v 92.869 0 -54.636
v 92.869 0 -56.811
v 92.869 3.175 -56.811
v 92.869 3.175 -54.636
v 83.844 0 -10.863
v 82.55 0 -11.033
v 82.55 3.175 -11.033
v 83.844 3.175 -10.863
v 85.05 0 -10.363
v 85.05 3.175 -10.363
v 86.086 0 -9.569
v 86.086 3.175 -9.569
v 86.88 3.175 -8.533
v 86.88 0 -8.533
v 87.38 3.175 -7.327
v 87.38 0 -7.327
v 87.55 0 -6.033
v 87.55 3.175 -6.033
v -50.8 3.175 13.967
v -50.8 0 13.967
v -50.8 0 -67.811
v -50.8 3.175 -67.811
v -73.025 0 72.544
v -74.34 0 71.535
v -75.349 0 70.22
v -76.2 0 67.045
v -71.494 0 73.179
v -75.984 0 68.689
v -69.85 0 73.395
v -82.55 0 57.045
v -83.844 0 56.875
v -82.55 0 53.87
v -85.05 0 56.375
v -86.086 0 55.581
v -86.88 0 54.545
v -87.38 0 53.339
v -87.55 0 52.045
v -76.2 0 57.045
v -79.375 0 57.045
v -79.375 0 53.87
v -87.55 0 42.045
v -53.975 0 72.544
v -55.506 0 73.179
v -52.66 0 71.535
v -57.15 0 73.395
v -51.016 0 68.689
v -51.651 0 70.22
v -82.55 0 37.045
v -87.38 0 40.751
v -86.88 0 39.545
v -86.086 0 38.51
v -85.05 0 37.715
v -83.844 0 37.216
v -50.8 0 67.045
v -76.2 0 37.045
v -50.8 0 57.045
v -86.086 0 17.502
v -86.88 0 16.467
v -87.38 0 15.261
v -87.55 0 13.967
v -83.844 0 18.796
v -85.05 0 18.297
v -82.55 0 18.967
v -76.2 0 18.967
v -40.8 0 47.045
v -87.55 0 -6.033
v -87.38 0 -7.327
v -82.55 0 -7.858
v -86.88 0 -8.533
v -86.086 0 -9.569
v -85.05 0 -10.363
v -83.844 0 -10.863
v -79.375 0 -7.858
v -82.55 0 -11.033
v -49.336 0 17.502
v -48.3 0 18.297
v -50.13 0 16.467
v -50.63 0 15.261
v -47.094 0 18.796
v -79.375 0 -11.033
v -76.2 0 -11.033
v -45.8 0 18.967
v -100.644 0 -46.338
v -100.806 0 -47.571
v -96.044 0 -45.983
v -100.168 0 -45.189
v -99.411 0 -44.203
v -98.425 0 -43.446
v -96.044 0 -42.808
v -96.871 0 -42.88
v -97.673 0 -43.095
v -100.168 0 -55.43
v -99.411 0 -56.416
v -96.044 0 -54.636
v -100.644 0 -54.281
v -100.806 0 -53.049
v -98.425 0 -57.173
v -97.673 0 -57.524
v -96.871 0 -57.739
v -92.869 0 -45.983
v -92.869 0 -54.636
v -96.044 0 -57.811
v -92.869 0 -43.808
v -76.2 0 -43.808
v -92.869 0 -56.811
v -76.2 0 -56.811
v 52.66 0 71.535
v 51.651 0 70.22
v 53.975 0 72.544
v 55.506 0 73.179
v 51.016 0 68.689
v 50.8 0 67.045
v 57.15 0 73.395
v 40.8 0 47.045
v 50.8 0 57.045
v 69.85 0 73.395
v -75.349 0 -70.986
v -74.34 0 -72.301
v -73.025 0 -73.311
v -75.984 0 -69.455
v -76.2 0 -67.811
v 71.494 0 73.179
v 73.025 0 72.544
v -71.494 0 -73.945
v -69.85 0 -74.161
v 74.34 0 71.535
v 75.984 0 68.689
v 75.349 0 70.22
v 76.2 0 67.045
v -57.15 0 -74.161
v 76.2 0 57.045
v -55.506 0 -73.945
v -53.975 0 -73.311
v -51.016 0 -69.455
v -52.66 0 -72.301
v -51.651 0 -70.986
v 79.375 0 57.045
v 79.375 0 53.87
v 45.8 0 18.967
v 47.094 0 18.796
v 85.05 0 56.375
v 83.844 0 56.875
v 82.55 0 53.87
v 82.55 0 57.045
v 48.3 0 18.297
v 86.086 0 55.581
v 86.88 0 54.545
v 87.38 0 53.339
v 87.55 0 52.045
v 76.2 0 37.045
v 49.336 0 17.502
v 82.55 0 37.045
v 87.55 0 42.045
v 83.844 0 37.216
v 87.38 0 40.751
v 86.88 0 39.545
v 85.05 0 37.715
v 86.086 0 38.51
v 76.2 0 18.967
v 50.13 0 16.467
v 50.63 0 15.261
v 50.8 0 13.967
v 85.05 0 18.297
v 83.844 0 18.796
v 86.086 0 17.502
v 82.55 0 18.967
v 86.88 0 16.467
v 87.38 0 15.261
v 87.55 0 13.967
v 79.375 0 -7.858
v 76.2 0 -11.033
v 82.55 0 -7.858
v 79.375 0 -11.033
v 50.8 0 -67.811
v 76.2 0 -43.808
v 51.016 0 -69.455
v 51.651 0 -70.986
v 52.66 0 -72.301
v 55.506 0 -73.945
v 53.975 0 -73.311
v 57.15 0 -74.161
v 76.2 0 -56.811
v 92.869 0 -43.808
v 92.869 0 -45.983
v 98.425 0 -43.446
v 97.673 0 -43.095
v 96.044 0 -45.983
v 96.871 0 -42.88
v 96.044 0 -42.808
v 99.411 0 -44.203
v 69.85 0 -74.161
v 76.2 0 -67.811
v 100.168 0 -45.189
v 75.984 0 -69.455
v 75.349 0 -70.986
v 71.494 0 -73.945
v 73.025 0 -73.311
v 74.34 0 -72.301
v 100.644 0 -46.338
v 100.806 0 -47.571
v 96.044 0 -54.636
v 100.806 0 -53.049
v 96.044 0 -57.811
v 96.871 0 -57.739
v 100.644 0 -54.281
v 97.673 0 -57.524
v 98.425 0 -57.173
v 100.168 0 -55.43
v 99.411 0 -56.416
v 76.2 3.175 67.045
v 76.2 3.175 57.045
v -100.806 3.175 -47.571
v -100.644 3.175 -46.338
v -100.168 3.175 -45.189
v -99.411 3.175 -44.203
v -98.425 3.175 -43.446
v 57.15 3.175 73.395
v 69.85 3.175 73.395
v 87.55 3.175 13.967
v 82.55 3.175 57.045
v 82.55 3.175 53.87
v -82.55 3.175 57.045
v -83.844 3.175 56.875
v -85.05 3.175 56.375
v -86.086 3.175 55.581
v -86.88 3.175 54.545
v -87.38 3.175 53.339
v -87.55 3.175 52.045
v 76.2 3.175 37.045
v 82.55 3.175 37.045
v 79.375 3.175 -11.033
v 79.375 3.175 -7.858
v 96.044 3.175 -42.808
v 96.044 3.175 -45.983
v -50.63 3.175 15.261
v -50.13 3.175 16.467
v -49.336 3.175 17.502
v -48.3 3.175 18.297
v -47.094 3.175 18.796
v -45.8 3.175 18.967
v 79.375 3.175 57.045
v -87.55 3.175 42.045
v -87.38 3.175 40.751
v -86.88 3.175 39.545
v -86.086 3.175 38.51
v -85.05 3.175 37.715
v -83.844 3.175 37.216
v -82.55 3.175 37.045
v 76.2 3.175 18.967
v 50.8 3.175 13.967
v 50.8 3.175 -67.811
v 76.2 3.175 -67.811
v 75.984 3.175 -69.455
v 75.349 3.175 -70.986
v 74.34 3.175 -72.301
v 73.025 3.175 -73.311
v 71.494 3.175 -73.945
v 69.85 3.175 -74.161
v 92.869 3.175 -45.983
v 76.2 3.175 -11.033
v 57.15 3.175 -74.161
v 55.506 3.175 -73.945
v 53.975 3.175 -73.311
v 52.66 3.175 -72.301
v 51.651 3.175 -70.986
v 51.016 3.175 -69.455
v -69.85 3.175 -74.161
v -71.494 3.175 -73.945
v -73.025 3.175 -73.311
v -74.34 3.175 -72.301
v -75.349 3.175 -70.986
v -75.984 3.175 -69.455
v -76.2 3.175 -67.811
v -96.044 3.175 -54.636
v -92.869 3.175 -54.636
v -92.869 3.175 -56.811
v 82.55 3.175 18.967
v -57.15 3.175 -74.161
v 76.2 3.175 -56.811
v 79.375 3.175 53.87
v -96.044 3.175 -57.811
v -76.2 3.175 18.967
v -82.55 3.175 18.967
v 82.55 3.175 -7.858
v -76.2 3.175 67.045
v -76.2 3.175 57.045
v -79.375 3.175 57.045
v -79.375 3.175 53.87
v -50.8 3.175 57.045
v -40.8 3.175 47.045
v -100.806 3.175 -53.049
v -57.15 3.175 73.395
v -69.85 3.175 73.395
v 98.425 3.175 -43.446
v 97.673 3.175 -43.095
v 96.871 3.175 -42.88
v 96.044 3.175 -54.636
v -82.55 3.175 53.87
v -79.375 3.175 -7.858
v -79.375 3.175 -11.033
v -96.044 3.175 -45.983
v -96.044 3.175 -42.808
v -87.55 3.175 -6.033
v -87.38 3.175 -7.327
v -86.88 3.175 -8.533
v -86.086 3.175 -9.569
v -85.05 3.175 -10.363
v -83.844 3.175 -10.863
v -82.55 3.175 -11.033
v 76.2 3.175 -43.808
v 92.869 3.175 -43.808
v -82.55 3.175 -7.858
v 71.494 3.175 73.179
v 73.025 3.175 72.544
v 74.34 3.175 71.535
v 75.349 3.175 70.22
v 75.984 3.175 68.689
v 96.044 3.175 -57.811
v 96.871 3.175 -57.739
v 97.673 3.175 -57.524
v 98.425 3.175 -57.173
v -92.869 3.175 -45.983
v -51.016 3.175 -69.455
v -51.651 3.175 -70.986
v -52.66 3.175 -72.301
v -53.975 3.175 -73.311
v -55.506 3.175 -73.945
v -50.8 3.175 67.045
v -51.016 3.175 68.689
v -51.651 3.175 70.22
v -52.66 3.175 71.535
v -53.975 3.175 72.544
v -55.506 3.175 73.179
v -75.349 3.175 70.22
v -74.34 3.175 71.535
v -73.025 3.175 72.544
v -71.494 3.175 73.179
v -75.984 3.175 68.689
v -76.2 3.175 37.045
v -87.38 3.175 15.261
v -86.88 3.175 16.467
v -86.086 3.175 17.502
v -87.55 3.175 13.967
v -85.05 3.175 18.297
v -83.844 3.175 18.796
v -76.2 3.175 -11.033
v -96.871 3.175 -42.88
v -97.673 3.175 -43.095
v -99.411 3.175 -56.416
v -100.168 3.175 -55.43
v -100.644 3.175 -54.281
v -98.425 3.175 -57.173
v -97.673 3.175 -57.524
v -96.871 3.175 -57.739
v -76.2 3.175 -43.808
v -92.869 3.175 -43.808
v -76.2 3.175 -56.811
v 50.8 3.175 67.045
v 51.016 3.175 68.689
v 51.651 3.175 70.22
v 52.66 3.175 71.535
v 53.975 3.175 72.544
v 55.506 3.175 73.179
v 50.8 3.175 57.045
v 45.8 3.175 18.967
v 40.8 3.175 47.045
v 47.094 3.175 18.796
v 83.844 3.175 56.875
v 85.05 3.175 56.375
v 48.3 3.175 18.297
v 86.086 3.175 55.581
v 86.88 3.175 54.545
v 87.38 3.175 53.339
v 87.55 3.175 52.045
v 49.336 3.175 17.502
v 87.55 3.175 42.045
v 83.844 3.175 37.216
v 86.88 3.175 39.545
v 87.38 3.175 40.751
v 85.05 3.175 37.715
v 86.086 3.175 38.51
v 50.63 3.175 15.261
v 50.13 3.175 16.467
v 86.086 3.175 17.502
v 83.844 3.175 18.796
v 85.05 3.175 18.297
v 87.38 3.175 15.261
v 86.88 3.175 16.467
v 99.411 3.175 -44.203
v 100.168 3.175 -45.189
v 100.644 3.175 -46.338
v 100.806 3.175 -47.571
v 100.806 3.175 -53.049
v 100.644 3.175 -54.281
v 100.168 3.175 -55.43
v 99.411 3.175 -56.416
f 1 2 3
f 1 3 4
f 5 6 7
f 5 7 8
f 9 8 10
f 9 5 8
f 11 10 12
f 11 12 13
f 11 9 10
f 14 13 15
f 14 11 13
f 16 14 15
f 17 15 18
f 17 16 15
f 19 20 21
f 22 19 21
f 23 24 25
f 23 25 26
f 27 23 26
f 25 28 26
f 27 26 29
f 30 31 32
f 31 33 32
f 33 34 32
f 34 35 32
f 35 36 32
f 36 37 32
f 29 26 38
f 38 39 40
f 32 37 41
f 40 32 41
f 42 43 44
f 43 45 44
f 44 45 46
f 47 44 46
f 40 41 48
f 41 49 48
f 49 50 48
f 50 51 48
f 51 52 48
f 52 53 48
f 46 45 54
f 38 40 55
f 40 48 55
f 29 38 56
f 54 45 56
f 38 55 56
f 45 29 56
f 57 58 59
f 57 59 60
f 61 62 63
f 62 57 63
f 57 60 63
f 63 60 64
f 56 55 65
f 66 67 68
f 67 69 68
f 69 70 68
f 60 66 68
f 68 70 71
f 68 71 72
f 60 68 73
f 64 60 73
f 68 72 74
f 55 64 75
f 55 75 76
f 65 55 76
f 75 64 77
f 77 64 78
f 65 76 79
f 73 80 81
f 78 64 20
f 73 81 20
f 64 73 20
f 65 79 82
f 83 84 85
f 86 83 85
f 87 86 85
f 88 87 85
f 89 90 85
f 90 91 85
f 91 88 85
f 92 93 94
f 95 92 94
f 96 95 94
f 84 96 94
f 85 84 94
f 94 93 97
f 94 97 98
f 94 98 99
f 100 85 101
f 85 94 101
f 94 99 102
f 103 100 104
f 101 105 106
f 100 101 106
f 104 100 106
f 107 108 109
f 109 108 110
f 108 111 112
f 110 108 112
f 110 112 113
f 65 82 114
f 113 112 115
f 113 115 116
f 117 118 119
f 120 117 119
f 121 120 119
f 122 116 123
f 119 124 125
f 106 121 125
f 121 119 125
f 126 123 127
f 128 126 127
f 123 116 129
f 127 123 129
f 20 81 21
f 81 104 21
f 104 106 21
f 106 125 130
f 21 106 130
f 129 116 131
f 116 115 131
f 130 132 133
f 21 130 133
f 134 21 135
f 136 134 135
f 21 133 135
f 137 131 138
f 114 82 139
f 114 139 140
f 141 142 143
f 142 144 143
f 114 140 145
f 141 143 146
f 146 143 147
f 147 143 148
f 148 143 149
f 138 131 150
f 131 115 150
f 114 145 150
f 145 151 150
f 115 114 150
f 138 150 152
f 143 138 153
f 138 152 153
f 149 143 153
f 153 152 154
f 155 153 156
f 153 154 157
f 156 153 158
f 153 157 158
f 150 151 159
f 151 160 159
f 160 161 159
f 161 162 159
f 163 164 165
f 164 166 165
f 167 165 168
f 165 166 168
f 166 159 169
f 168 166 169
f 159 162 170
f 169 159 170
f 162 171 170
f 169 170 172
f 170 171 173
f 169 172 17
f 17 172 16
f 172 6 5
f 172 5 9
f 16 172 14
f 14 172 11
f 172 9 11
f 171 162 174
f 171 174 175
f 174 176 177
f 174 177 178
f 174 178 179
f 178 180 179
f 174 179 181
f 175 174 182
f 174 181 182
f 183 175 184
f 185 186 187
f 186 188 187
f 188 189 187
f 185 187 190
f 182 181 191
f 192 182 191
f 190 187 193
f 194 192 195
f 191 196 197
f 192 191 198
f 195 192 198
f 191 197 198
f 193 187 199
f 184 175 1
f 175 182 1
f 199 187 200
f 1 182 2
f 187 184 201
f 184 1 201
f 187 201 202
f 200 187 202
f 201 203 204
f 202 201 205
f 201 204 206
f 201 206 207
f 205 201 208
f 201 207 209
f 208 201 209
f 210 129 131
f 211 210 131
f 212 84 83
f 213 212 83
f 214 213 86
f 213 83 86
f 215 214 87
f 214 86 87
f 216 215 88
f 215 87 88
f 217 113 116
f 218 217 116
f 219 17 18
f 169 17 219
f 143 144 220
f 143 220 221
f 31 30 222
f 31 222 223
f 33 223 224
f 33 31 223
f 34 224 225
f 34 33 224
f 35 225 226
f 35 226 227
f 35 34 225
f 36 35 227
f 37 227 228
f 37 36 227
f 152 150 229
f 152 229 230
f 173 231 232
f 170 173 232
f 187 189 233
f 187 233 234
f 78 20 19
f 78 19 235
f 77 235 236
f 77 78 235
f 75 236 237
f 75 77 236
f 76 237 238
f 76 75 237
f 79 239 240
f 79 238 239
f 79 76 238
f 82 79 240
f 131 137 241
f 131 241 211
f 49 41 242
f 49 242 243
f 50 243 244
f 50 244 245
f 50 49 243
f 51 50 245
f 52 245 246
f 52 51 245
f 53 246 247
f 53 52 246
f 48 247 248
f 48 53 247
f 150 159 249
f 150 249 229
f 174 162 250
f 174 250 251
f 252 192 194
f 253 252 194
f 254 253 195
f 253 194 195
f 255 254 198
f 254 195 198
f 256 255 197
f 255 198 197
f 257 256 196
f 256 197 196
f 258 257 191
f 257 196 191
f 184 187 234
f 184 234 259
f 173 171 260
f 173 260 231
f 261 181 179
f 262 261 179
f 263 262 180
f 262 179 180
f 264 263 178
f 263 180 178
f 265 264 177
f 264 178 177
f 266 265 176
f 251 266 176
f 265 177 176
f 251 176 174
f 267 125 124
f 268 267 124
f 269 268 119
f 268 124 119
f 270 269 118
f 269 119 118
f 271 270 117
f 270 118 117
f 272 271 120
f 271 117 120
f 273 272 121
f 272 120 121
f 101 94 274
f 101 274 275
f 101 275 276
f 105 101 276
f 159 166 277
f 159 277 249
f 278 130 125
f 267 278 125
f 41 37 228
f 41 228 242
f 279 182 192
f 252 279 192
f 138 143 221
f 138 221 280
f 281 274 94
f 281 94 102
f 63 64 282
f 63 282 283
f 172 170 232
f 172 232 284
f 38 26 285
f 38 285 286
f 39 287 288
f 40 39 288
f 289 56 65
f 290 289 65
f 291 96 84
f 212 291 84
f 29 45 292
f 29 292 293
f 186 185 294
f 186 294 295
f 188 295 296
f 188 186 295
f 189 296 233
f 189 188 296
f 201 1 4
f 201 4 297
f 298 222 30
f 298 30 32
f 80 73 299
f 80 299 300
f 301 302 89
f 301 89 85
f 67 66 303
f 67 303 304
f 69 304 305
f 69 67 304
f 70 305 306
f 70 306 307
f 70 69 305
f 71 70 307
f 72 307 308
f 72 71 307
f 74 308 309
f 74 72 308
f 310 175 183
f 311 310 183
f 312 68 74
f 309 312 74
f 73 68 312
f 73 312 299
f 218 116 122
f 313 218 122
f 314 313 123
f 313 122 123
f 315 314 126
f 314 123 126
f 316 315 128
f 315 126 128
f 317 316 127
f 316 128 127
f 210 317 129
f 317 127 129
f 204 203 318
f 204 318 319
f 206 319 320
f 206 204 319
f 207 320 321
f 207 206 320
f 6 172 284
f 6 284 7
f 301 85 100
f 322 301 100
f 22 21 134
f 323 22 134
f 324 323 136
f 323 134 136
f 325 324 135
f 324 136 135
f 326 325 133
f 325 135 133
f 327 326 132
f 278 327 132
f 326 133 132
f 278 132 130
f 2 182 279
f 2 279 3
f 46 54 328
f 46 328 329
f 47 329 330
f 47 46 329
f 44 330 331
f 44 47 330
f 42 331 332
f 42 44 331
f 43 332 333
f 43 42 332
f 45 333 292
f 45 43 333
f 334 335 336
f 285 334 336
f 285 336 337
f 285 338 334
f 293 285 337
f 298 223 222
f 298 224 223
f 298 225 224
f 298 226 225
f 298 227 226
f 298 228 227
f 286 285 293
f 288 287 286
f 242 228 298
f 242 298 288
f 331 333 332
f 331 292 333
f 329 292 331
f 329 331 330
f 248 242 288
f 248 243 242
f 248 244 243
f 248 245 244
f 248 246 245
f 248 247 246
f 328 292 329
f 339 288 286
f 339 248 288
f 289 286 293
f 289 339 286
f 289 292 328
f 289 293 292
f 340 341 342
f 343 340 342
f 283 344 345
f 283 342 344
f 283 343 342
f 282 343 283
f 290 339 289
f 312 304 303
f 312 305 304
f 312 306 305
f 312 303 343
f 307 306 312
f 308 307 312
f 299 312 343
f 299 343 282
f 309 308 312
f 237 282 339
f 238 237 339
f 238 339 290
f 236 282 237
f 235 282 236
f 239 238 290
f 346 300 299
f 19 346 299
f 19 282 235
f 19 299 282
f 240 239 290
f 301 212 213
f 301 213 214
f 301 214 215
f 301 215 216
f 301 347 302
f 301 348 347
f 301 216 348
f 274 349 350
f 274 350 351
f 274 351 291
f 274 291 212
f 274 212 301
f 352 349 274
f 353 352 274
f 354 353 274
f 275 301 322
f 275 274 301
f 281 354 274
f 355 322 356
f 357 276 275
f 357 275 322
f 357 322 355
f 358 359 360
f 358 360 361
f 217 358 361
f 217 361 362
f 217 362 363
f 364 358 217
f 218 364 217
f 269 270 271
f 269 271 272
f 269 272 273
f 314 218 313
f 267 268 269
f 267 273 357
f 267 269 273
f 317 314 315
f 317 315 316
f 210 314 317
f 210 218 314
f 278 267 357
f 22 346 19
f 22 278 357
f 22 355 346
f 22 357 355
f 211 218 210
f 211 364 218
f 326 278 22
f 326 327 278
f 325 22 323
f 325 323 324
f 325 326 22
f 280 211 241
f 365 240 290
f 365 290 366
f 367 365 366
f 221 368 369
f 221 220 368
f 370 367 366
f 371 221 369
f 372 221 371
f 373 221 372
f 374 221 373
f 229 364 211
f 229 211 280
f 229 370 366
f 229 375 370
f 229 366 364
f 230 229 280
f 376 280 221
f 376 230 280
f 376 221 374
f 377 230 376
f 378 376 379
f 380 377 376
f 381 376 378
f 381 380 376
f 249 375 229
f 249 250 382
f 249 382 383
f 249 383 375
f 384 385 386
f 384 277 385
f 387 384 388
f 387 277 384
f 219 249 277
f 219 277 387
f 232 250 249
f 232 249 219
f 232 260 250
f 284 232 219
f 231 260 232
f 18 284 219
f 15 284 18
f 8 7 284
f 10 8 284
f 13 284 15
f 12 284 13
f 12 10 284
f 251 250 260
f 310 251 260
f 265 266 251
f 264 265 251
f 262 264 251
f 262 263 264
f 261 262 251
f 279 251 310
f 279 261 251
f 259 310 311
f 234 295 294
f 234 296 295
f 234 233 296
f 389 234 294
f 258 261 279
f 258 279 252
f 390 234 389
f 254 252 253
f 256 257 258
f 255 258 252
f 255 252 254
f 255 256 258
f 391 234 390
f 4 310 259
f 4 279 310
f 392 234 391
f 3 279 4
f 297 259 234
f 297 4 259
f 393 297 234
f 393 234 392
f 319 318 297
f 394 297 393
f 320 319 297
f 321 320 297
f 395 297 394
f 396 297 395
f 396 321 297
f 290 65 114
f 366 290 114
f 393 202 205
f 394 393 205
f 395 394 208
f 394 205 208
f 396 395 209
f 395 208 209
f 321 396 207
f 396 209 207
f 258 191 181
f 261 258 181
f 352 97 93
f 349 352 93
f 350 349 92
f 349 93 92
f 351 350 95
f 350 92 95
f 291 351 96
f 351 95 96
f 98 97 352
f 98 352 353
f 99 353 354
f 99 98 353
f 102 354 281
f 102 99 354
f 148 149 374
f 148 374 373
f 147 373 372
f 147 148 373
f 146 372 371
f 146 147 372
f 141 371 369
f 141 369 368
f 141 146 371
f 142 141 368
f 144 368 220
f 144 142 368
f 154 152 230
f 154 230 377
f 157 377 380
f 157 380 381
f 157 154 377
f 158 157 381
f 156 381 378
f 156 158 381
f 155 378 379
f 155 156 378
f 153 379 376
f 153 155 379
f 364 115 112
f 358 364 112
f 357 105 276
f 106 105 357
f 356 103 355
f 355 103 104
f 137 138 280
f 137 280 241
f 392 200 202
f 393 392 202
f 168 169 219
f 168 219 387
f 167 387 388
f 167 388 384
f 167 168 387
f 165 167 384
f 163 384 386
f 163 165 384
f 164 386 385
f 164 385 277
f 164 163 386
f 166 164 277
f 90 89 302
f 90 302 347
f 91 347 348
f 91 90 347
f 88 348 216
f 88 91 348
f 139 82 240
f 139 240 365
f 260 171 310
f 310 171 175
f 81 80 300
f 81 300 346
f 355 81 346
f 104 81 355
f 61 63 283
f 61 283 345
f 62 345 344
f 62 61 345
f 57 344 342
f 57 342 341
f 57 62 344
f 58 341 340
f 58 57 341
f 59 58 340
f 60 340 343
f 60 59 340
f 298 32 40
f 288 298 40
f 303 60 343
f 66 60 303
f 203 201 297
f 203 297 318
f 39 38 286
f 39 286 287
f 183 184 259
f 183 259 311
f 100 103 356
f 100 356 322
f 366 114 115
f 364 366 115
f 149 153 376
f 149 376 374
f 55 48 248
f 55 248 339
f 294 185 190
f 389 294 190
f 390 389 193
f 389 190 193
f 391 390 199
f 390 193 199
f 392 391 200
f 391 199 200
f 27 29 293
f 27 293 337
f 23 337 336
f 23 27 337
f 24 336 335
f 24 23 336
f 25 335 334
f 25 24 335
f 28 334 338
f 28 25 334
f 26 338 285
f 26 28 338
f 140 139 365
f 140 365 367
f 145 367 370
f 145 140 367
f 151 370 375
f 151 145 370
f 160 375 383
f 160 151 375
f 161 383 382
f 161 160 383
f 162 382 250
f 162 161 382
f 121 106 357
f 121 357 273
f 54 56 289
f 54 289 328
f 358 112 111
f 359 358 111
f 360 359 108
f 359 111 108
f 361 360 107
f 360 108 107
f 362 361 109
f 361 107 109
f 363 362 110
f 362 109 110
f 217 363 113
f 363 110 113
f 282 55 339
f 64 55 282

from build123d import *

# Parameters (mm, degrees)
SKETCH1_W           = 196.85
SKETCH1_H           = 120
BOSS_EXTRUDE1_DEPTH = 3.175
SKETCH2_W           = 152.4
SKETCH2_H           = 2.188710325
SKETCH2_W_2         = 3.175
SKETCH2_H_2         = 3.175
CUT_EXTRUDE3_DEPTH  = 3.175
BOSS_EXTRUDE3_DEPTH = 3.175
CUT_EXTRUDE5_DEPTH  = 6.175
BOSS_EXTRUDE4_DEPTH = 3.175
SKETCH8_W           = 16.66875
SKETCH8_H           = 1
CUT_EXTRUDE6_DEPTH  = 4
SKETCH9_W           = 16.66875
SKETCH9_H           = 1
CUT_EXTRUDE7_DEPTH  = 4


with BuildPart() as part:
    # Sketch1 → Boss-Extrude1 (new body)
    with BuildSketch(Plane(origin=(0, 0, 0), x_dir=(1, 0, 0), z_dir=(0, 1, 0))):
        Rectangle(SKETCH1_W, SKETCH1_H)
    extrude(amount=BOSS_EXTRUDE1_DEPTH)

    # Sketch2 → Cut-Extrude3 (cut)
    with BuildSketch(Plane(origin=(0, 0, 0), x_dir=(1, 0, 0), z_dir=(0, 1, 0))):
        with BuildLine():
            ThreePointArc((-87.55, -42.045183145), (-86.085533906, -38.509649239), (-82.55, -37.045183145))
            Line((-82.55, -37.045183145), (-98.425, -37.045183145))
            Line((-98.425, -37.045183145), (-98.425, -57.045183145))
            Line((-98.425, -57.045183145), (-82.55, -57.045183145))
            ThreePointArc((-82.55, -57.045183145), (-86.085533906, -55.580717051), (-87.55, -52.045183145))
            Line((-87.55, -52.045183145), (-87.55, -42.045183145))
        make_face()
        Polygon((-82.55, -37.045183145), (-76.2, -37.045183145), (-76.2, -18.966736095), (-82.55, -18.966736095), (-98.425, -18.966736095), (-98.425, -37.045183145), align=None)
        with BuildLine():
            Line((-98.425, -18.966736095), (-82.55, -18.966736095))
            ThreePointArc((-82.55, -18.966736095), (-86.085533906, -17.502270001), (-87.55, -13.966736095))
            Line((-87.55, -13.966736095), (-87.55, 6.033263905))
            ThreePointArc((-87.55, 6.033263905), (-86.085533906, 9.568797811), (-82.55, 11.033263905))
            Line((-82.55, 11.033263905), (-98.425, 11.033263905))
            Line((-98.425, 11.033263905), (-98.425, -18.966736095))
        make_face()
        with BuildLine():
            Line((-76.2, 11.033263905), (-76.2, 42.808053265))
            Line((-76.2, 42.808053265), (-92.86875, 42.808053265))
            Line((-92.86875, 42.808053265), (-96.04375, 42.808053265))
            ThreePointArc((-96.04375, 42.808053265), (-97.276375702, 42.970331517), (-98.425, 43.44610728))
            Line((-98.425, 43.44610728), (-98.425, 11.033263905))
            Line((-98.425, 11.033263905), (-82.55, 11.033263905))
            Line((-82.55, 11.033263905), (-79.375, 11.033263905))
            Line((-79.375, 11.033263905), (-76.2, 11.033263905))
        make_face()
        with BuildLine():
            Line((-92.86875, 57.811289675), (-76.2, 57.811289675))
            Line((-76.2, 57.811289675), (-76.2, 60))
            Line((-76.2, 60), (-98.425, 60))
            Line((-98.425, 60), (-98.425, 57.173235661))
            ThreePointArc((-98.425, 57.173235661), (-97.276375702, 57.649011423), (-96.04375, 57.811289675))
            Line((-96.04375, 57.811289675), (-92.86875, 57.811289675))
        make_face()
        with Locations((0, 58.905644838)):
            Rectangle(SKETCH2_W, SKETCH2_H)
        with BuildLine():
            Line((76.2, 60), (76.2, 57.811289675))
            Line((76.2, 57.811289675), (92.86875, 57.811289675))
            Line((92.86875, 57.811289675), (92.86875, 54.636289675))
            Line((92.86875, 54.636289675), (96.04375, 54.636289675))
            Line((96.04375, 54.636289675), (96.04375, 57.811289675))
            ThreePointArc((96.04375, 57.811289675), (97.276375702, 57.649011423), (98.425, 57.173235661))
            Line((98.425, 57.173235661), (98.425, 60))
            Line((98.425, 60), (76.2, 60))
        make_face()
        with BuildLine():
            Line((79.375, -18.966736095), (76.2, -18.966736095))
            Line((76.2, -18.966736095), (76.2, -37.045183145))
            Line((76.2, -37.045183145), (82.55, -37.045183145))
            ThreePointArc((82.55, -37.045183145), (86.085533906, -38.509649239), (87.55, -42.045183145))
            Line((87.55, -42.045183145), (87.55, -52.045183145))
            ThreePointArc((87.55, -52.045183145), (86.085533906, -55.580717051), (82.55, -57.045183145))
            Line((82.55, -57.045183145), (82.55, -53.870183145))
            Line((82.55, -53.870183145), (79.375, -53.870183145))
            Line((79.375, -53.870183145), (79.375, -57.045183145))
            Line((79.375, -57.045183145), (76.2, -57.045183145))
            Line((76.2, -57.045183145), (76.2, -59.23389347))
            Line((76.2, -59.23389347), (76.2, -60))
            Line((76.2, -60), (98.425, -60))
            Line((98.425, -60), (98.425, 0))
            Line((98.425, 0), (98.425, 43.44610728))
            ThreePointArc((98.425, 43.44610728), (97.276375702, 42.970331517), (96.04375, 42.808053265))
            Line((96.04375, 42.808053265), (96.04375, 45.983053265))
            Line((96.04375, 45.983053265), (92.86875, 45.983053265))
            Line((92.86875, 45.983053265), (92.86875, 42.808053265))
            Line((92.86875, 42.808053265), (87.3125, 42.808053265))
            Line((87.3125, 42.808053265), (76.2, 42.808053265))
            Line((76.2, 42.808053265), (76.2, 11.033263905))
            Line((76.2, 11.033263905), (79.375, 11.033263905))
            Line((79.375, 11.033263905), (79.375, 7.858263905))
            Line((79.375, 7.858263905), (82.55, 7.858263905))
            Line((82.55, 7.858263905), (82.55, 11.033263905))
            ThreePointArc((82.55, 11.033263905), (86.085533906, 9.568797811), (87.55, 6.033263905))
            Line((87.55, 6.033263905), (87.55, -13.966736095))
            ThreePointArc((87.55, -13.966736095), (86.085533906, -17.502270001), (82.55, -18.966736095))
            Line((82.55, -18.966736095), (79.375, -18.966736095))
        make_face()
        Polygon((76.2, -59.23389347), (76.2, -57.045183145), (-76.2, -57.045183145), (-76.2, -59.23389347), (-76.2, -60), (76.2, -60), align=None)
        Polygon((-76.2, -59.23389347), (-76.2, -57.045183145), (-79.375, -57.045183145), (-82.55, -57.045183145), (-98.425, -57.045183145), (-98.425, -60), (-76.2, -60), align=None)
        with Locations((-80.9625, -55.457683145)):
            Rectangle(SKETCH2_W_2, SKETCH2_H_2)
        with Locations((-80.9625, 9.445763905)):
            Rectangle(SKETCH2_W_2, SKETCH2_H_2)
        with Locations((-94.45625, 44.395553265)):
            Rectangle(SKETCH2_W_2, SKETCH2_H_2)
        with Locations((-94.45625, 56.223789675)):
            Rectangle(SKETCH2_W_2, SKETCH2_H_2)
    extrude(amount=CUT_EXTRUDE3_DEPTH, mode=Mode.SUBTRACT)

    # Sketch5 → Boss-Extrude3 (add)
    with BuildSketch(Plane(origin=(0, 0, 0), x_dir=(1, 0, 0), z_dir=(0, 1, 0))):
        with BuildLine():
            ThreePointArc((-98.425, 57.173235661), (-100.168195986, 55.430039675), (-100.80625, 53.048789675))
            Line((-100.80625, 53.048789675), (-100.80625, 47.570553265))
            ThreePointArc((-100.80625, 47.570553265), (-100.168195986, 45.189303265), (-98.425, 43.44610728))
            Line((-98.425, 43.44610728), (-98.425, 57.173235661))
        make_face()
        with BuildLine():
            ThreePointArc((100.80625, 53.048789675), (100.168195986, 55.430039675), (98.425, 57.173235661))
            Line((98.425, 57.173235661), (98.425, 43.44610728))
            ThreePointArc((98.425, 43.44610728), (100.168195986, 45.189303265), (100.80625, 47.570553265))
            Line((100.80625, 47.570553265), (100.80625, 53.048789675))
        make_face()
    extrude(amount=BOSS_EXTRUDE3_DEPTH)

    # Sketch6 → Cut-Extrude5 (cut)
    with BuildSketch(Plane(origin=(0, 0, 0), x_dir=(1, 0, 0), z_dir=(0, 1, 0))):
        with BuildLine():
            Line((-45.8, -18.966736095), (45.8, -18.966736095))
            ThreePointArc((45.8, -18.966736095), (49.335533906, -17.502270001), (50.8, -13.966736095))
            Line((50.8, -13.966736095), (50.8, 57.811289675))
            Line((50.8, 57.811289675), (-50.8, 57.811289675))
            Line((-50.8, 57.811289675), (-50.8, -13.966736095))
            ThreePointArc((-50.8, -13.966736095), (-49.335533906, -17.502270001), (-45.8, -18.966736095))
        make_face()
        Polygon((-50.8, -57.045183145), (-40.8, -47.045183145), (40.8, -47.045183145), (50.8, -57.045183145), align=None)
    extrude(amount=CUT_EXTRUDE5_DEPTH, mode=Mode.SUBTRACT)

    # Sketch7 → Boss-Extrude4 (add)
    with BuildSketch(Plane(origin=(0, 0, 0), x_dir=(1, 0, 0), z_dir=(0, 1, 0))):
        with BuildLine():
            Line((-50.8, 57.811289675), (-50.8, 67.811289675))
            ThreePointArc((-50.8, 67.811289675), (-52.659871939, 72.301417736), (-57.15, 74.161289675))
            Line((-57.15, 74.161289675), (-69.85, 74.161289675))
            ThreePointArc((-69.85, 74.161289675), (-74.340128061, 72.301417736), (-76.2, 67.811289675))
            Line((-76.2, 67.811289675), (-76.2, 57.811289675))
            Line((-76.2, 57.811289675), (-50.8, 57.811289675))
        make_face()
        with BuildLine():
            Line((76.2, 57.811289675), (76.2, 67.811289675))
            ThreePointArc((76.2, 67.811289675), (74.340128061, 72.301417736), (69.85, 74.161289675))
            Line((69.85, 74.161289675), (57.15, 74.161289675))
            ThreePointArc((57.15, 74.161289675), (52.659871939, 72.301417736), (50.8, 67.811289675))
            Line((50.8, 67.811289675), (50.8, 57.811289675))
            Line((50.8, 57.811289675), (76.2, 57.811289675))
        make_face()
        with BuildLine():
            ThreePointArc((-50.8, -67.045183145), (-52.659871939, -71.535311205), (-57.15, -73.395183145))
            Line((-57.15, -73.395183145), (-69.85, -73.395183145))
            ThreePointArc((-69.85, -73.395183145), (-74.340128061, -71.535311205), (-76.2, -67.045183145))
            Line((-76.2, -67.045183145), (-76.2, -57.045183145))
            Line((-76.2, -57.045183145), (-50.8, -57.045183145))
            Line((-50.8, -57.045183145), (-50.8, -67.045183145))
        make_face()
        with BuildLine():
            Line((50.8, -57.045183145), (50.8, -67.045183145))
            ThreePointArc((50.8, -67.045183145), (52.659871939, -71.535311205), (57.15, -73.395183145))
            Line((57.15, -73.395183145), (69.85, -73.395183145))
            ThreePointArc((69.85, -73.395183145), (74.340128061, -71.535311205), (76.2, -67.045183145))
            Line((76.2, -67.045183145), (76.2, -57.045183145))
            Line((76.2, -57.045183145), (50.8, -57.045183145))
        make_face()
    extrude(amount=BOSS_EXTRUDE4_DEPTH)

    # Sketch8 → Cut-Extrude6 (cut)
    with BuildSketch(Plane(origin=(0, 0, 0), x_dir=(1, 0, 0), z_dir=(0, 1, 0))):
        with Locations((84.534375, 43.308053265)):
            Rectangle(SKETCH8_W, SKETCH8_H)
        with Locations((84.534375, 57.311289675)):
            Rectangle(SKETCH8_W, SKETCH8_H)
    extrude(amount=CUT_EXTRUDE6_DEPTH, mode=Mode.SUBTRACT)

    # Sketch9 → Cut-Extrude7 (cut)
    with BuildSketch(Plane(origin=(0, 0, 0), x_dir=(1, 0, 0), z_dir=(0, 1, 0))):
        with Locations((-84.534375, 57.311289675)):
            Rectangle(SKETCH9_W, SKETCH9_H)
        with Locations((-84.534375, 43.308053265)):
            Rectangle(SKETCH9_W, SKETCH9_H)
    extrude(amount=CUT_EXTRUDE7_DEPTH, mode=Mode.SUBTRACT)


solid = part.part
